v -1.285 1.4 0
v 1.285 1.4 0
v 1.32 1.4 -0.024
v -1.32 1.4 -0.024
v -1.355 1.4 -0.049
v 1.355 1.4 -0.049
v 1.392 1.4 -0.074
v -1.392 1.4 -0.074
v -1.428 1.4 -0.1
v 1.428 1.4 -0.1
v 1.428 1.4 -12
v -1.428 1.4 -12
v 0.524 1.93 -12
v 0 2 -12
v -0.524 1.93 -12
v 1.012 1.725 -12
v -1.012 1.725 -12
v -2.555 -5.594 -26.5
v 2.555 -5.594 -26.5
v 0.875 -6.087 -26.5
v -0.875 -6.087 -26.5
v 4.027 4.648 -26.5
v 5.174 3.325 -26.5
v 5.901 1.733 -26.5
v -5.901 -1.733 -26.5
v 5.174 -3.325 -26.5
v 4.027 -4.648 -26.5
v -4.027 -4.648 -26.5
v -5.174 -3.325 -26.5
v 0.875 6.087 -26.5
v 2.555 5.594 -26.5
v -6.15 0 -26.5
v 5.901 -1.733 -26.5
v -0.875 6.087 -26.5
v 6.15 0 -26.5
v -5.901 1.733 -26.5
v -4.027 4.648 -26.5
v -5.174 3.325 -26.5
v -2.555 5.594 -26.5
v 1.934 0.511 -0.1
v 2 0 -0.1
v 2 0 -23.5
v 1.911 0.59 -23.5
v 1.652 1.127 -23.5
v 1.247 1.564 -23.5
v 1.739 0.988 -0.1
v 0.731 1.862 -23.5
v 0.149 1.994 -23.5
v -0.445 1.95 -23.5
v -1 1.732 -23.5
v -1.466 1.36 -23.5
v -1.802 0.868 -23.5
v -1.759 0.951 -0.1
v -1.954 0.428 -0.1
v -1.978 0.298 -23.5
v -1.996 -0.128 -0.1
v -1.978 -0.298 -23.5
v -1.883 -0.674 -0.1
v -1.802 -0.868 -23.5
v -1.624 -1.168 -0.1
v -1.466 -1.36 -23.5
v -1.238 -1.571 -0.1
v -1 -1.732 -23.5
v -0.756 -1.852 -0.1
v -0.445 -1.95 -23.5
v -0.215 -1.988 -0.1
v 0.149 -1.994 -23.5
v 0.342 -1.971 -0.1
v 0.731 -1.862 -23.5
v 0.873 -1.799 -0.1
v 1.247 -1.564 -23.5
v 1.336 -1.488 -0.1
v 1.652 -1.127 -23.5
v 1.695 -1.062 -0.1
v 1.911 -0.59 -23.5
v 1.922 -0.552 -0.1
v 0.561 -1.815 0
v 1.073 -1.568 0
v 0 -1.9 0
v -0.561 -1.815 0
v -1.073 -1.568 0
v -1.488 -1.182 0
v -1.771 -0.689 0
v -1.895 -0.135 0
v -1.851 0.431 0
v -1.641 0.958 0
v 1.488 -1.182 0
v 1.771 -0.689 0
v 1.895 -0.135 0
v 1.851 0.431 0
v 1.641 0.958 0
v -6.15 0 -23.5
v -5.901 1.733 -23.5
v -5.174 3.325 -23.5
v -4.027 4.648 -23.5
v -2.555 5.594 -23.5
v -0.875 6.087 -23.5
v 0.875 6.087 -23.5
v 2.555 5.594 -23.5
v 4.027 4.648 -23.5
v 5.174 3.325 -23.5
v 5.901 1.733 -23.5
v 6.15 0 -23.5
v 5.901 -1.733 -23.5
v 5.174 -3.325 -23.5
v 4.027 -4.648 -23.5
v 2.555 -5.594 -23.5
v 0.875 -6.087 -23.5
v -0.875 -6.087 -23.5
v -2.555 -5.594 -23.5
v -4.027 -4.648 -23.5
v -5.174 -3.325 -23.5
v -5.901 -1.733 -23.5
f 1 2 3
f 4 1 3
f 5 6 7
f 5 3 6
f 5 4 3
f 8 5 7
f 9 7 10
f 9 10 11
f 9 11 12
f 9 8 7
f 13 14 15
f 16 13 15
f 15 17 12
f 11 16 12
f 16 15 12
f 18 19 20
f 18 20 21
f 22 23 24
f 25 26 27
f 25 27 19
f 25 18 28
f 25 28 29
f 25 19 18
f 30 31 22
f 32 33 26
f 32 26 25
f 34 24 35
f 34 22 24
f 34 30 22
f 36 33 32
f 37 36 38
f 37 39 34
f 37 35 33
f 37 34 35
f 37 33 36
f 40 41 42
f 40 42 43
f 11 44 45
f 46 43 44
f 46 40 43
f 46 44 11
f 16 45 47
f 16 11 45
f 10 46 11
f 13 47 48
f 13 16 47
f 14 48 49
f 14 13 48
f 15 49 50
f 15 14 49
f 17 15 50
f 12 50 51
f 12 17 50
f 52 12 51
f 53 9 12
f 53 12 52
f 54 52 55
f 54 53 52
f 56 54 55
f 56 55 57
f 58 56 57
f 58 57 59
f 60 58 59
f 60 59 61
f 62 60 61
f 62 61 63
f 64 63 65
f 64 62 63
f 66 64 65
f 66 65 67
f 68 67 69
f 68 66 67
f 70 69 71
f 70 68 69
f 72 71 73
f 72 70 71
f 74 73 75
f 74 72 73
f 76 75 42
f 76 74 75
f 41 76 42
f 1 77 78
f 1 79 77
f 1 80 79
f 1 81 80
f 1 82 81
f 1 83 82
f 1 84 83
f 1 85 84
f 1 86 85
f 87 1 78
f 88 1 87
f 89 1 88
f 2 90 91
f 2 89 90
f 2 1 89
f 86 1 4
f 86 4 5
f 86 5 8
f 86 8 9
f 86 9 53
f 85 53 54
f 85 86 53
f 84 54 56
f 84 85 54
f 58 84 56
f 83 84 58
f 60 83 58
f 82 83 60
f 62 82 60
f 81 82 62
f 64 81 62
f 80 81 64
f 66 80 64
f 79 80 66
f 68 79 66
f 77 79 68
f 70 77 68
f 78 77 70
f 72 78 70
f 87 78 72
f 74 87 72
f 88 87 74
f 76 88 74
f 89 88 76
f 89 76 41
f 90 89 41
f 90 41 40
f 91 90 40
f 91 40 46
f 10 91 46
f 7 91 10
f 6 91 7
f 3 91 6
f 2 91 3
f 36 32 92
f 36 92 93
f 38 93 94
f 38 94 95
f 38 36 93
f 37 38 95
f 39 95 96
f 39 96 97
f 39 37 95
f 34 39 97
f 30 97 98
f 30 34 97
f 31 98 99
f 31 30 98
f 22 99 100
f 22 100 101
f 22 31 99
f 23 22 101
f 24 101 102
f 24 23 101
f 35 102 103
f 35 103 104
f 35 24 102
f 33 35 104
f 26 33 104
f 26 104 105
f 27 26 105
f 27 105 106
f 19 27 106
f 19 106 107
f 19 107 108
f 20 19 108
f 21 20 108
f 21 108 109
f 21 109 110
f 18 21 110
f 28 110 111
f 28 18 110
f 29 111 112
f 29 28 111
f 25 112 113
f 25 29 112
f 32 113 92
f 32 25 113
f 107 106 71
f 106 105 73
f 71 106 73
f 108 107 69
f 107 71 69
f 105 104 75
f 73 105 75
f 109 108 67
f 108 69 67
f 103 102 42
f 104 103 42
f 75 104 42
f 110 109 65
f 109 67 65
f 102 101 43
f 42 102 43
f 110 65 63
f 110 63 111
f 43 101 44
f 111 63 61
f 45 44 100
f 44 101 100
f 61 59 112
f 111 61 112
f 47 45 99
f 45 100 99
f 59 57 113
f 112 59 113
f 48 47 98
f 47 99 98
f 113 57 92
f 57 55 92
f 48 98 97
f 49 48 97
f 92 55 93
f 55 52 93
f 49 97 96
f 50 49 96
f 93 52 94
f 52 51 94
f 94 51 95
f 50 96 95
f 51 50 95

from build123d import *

# Parameters (mm, degrees)
SKETCH1_R           = 2
BOSS_EXTRUDE1_DEPTH = 26.5
SKETCH2_R           = 6.15
BOSS_EXTRUDE2_DEPTH = 3
CHAMFER1_SIZE       = 0.1
CUT_EXTRUDE2_DEPTH  = 12


with BuildPart() as part:
    # Sketch1 → Boss-Extrude1 (new body)
    with BuildSketch(Plane.XY):
        Circle(SKETCH1_R)
    extrude(amount=-BOSS_EXTRUDE1_DEPTH)

    # Sketch2 → Boss-Extrude2 (add)
    with BuildSketch(Plane(origin=(0, 0, -26.5), x_dir=(-1, 0, 0), z_dir=(0, 0, -1))):
        Circle(SKETCH2_R)
    extrude(amount=-BOSS_EXTRUDE2_DEPTH)

    # Chamfer1
    chamfer1_edges = [part.edges().sort_by_distance(p)[0] for p in [
        (-2, 0, 0),
    ]]
    chamfer(chamfer1_edges, length=CHAMFER1_SIZE)

    # Sketch3 → Cut-Extrude2 (cut)
    with BuildSketch(Plane.XY):
        with BuildLine():
            Line((1.428285686, 1.4), (-1.428285686, 1.4))
            ThreePointArc((-1.428285686, 1.4), (0, 2), (1.428285686, 1.4))
        make_face()
    extrude(amount=-CUT_EXTRUDE2_DEPTH, mode=Mode.SUBTRACT)


solid = part.part
